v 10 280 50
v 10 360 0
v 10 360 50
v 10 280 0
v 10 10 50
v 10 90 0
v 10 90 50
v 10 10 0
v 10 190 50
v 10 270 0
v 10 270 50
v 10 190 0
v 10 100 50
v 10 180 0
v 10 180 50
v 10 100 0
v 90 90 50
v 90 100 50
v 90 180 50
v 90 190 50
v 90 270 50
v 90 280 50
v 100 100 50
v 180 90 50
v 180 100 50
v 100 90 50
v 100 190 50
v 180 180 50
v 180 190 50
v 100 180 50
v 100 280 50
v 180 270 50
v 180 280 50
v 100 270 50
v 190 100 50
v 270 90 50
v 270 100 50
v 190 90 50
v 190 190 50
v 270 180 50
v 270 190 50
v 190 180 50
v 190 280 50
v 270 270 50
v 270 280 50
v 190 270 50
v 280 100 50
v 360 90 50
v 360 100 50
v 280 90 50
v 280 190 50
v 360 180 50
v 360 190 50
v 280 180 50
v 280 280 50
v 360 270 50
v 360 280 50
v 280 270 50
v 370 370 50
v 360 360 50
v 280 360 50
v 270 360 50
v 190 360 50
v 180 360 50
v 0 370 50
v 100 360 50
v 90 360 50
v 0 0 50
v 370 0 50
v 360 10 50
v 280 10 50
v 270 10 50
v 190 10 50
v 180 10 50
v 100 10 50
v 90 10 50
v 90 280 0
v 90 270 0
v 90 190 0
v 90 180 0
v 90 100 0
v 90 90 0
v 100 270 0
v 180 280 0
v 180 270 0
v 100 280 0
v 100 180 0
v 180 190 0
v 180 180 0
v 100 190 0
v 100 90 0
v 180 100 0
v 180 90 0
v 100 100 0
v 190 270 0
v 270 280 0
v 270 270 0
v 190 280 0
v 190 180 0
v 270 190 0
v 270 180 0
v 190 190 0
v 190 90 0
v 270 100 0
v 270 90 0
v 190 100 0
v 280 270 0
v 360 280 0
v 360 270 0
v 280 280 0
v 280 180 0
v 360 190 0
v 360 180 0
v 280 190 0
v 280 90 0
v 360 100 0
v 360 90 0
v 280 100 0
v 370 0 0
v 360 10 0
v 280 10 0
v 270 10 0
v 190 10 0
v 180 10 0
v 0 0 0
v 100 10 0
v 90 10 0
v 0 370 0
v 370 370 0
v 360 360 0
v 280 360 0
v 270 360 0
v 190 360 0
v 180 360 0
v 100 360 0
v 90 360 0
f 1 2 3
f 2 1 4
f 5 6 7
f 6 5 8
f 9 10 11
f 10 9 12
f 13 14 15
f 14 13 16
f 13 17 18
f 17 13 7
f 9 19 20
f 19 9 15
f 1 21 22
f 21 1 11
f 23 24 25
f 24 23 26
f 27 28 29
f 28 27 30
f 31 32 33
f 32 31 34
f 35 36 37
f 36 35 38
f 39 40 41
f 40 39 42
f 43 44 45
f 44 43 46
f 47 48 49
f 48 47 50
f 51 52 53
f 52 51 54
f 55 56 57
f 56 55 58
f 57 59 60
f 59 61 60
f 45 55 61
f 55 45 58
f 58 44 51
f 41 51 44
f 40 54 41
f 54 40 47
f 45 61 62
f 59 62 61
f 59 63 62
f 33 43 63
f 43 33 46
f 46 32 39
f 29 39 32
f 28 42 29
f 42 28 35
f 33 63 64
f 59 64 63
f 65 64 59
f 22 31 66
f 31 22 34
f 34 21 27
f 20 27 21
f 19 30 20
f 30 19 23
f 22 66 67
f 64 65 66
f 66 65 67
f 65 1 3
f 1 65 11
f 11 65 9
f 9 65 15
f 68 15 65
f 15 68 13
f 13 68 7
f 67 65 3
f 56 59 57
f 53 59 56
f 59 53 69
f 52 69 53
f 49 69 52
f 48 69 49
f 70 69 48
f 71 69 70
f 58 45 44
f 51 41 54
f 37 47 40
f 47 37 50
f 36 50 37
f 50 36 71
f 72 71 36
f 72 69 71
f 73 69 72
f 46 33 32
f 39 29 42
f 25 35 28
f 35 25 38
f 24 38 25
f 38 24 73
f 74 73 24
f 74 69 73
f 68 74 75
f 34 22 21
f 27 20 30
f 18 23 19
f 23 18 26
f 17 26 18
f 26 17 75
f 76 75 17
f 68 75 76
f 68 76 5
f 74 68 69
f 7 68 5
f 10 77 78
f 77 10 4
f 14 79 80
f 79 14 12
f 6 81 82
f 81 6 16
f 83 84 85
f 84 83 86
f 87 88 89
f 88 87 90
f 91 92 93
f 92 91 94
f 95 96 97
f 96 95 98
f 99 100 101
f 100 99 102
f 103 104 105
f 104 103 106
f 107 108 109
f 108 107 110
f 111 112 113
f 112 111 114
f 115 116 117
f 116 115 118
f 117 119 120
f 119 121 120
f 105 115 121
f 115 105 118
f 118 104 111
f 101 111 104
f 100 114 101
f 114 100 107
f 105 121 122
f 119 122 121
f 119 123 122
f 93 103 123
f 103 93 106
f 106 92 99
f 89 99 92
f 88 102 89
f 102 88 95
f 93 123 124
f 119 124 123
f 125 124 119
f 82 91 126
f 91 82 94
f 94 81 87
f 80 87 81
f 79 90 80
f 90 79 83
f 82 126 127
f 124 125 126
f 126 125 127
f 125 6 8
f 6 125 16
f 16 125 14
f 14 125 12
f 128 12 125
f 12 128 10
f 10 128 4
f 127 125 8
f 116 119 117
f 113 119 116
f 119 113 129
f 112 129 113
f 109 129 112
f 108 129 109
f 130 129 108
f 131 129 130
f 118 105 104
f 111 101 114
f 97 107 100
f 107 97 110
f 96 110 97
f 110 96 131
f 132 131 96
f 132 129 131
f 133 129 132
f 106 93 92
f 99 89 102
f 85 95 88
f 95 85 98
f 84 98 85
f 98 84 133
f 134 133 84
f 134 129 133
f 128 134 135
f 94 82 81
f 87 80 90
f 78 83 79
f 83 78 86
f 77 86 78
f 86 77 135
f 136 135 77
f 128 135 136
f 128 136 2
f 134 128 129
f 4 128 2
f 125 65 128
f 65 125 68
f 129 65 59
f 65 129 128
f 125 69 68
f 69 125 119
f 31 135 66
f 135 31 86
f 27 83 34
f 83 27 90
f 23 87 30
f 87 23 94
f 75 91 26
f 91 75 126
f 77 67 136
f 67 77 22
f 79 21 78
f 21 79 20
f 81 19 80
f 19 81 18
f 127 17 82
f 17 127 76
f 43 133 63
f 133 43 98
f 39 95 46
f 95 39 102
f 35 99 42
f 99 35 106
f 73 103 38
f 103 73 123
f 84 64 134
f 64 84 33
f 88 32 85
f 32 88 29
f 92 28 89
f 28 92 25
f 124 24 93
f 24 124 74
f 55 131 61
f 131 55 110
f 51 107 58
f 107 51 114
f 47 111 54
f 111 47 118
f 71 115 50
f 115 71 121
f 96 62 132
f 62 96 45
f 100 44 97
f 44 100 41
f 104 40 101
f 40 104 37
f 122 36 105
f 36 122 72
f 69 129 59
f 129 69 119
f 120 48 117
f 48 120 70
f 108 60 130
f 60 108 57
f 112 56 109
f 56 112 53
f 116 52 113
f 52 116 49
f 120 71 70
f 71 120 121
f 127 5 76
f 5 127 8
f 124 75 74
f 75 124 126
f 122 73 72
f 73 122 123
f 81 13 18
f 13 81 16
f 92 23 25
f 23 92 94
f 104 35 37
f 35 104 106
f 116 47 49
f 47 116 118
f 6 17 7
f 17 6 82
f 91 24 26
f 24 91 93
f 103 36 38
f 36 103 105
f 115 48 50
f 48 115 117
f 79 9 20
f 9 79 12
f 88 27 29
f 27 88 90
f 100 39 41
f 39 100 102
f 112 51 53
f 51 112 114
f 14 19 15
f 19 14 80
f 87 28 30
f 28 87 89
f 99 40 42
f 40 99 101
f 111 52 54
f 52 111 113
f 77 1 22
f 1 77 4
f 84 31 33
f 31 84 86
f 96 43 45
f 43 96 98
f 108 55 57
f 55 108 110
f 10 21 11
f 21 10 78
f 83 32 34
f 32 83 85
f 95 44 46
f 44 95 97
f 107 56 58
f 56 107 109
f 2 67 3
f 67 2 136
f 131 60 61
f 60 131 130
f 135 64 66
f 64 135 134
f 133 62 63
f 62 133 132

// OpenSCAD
// OpenSCAD: One 50 mm-thick slice (370 x 370) of a 3D printed cage grid
// Grid: 5 bars along X (width 370, cross-section 10x10), 5 bars along Y (length 370), plus 4 corner vertical bars (Z-direction) with M6 clearance holes
// Parameters
t = 10;           // bar thickness (mm), square cross-section 10x10
g = 80;            // gap between adjacent bars (mm)
size = 370;         // outer footprint (X and Y) in mm
height_slice = 50;  // slice thickness along Z (mm)
hole_d = 6.5;     // through-hole diameter for M6 clearance (mm)
hole_r = hole_d/2;

module corner_bar_with_hole(cx, cy){
    // Corner bar: 10x10x50 with through-hole centered in the bar
    difference(){
        translate([cx, cy, 0]) cube([t, t, height_slice]);
        translate([cx + t/2, cy + t/2, 0]) cylinder(h=height_slice, r=hole_r, center=false);
    }
}

module grid_slice(){
    // Bars along Y (vertical strands in X direction)
    for(i=[0,1,2,3,4]){
        x = i*(t + g);
        translate([x, 0, 0]) cube([t, size, height_slice]);
    }
    // Bars along X (horizontal strands in Y direction)
    for(j=[0,1,2,3,4]){
        y = j*(t + g);
        translate([0, y, 0]) cube([size, t, height_slice]);
    }
    // Corner vertical bars with through-holes (Z-direction)
    corner_bar_with_hole(0, 0);           // bottom-left
    corner_bar_with_hole(size - t, 0);    // bottom-right (x=360)
    corner_bar_with_hole(0, size - t);    // top-left (y=360)
    corner_bar_with_hole(size - t, size - t); // top-right (x=360, y=360)
}

// Render one slice at its local origin (0,0,0)
grid_slice();
